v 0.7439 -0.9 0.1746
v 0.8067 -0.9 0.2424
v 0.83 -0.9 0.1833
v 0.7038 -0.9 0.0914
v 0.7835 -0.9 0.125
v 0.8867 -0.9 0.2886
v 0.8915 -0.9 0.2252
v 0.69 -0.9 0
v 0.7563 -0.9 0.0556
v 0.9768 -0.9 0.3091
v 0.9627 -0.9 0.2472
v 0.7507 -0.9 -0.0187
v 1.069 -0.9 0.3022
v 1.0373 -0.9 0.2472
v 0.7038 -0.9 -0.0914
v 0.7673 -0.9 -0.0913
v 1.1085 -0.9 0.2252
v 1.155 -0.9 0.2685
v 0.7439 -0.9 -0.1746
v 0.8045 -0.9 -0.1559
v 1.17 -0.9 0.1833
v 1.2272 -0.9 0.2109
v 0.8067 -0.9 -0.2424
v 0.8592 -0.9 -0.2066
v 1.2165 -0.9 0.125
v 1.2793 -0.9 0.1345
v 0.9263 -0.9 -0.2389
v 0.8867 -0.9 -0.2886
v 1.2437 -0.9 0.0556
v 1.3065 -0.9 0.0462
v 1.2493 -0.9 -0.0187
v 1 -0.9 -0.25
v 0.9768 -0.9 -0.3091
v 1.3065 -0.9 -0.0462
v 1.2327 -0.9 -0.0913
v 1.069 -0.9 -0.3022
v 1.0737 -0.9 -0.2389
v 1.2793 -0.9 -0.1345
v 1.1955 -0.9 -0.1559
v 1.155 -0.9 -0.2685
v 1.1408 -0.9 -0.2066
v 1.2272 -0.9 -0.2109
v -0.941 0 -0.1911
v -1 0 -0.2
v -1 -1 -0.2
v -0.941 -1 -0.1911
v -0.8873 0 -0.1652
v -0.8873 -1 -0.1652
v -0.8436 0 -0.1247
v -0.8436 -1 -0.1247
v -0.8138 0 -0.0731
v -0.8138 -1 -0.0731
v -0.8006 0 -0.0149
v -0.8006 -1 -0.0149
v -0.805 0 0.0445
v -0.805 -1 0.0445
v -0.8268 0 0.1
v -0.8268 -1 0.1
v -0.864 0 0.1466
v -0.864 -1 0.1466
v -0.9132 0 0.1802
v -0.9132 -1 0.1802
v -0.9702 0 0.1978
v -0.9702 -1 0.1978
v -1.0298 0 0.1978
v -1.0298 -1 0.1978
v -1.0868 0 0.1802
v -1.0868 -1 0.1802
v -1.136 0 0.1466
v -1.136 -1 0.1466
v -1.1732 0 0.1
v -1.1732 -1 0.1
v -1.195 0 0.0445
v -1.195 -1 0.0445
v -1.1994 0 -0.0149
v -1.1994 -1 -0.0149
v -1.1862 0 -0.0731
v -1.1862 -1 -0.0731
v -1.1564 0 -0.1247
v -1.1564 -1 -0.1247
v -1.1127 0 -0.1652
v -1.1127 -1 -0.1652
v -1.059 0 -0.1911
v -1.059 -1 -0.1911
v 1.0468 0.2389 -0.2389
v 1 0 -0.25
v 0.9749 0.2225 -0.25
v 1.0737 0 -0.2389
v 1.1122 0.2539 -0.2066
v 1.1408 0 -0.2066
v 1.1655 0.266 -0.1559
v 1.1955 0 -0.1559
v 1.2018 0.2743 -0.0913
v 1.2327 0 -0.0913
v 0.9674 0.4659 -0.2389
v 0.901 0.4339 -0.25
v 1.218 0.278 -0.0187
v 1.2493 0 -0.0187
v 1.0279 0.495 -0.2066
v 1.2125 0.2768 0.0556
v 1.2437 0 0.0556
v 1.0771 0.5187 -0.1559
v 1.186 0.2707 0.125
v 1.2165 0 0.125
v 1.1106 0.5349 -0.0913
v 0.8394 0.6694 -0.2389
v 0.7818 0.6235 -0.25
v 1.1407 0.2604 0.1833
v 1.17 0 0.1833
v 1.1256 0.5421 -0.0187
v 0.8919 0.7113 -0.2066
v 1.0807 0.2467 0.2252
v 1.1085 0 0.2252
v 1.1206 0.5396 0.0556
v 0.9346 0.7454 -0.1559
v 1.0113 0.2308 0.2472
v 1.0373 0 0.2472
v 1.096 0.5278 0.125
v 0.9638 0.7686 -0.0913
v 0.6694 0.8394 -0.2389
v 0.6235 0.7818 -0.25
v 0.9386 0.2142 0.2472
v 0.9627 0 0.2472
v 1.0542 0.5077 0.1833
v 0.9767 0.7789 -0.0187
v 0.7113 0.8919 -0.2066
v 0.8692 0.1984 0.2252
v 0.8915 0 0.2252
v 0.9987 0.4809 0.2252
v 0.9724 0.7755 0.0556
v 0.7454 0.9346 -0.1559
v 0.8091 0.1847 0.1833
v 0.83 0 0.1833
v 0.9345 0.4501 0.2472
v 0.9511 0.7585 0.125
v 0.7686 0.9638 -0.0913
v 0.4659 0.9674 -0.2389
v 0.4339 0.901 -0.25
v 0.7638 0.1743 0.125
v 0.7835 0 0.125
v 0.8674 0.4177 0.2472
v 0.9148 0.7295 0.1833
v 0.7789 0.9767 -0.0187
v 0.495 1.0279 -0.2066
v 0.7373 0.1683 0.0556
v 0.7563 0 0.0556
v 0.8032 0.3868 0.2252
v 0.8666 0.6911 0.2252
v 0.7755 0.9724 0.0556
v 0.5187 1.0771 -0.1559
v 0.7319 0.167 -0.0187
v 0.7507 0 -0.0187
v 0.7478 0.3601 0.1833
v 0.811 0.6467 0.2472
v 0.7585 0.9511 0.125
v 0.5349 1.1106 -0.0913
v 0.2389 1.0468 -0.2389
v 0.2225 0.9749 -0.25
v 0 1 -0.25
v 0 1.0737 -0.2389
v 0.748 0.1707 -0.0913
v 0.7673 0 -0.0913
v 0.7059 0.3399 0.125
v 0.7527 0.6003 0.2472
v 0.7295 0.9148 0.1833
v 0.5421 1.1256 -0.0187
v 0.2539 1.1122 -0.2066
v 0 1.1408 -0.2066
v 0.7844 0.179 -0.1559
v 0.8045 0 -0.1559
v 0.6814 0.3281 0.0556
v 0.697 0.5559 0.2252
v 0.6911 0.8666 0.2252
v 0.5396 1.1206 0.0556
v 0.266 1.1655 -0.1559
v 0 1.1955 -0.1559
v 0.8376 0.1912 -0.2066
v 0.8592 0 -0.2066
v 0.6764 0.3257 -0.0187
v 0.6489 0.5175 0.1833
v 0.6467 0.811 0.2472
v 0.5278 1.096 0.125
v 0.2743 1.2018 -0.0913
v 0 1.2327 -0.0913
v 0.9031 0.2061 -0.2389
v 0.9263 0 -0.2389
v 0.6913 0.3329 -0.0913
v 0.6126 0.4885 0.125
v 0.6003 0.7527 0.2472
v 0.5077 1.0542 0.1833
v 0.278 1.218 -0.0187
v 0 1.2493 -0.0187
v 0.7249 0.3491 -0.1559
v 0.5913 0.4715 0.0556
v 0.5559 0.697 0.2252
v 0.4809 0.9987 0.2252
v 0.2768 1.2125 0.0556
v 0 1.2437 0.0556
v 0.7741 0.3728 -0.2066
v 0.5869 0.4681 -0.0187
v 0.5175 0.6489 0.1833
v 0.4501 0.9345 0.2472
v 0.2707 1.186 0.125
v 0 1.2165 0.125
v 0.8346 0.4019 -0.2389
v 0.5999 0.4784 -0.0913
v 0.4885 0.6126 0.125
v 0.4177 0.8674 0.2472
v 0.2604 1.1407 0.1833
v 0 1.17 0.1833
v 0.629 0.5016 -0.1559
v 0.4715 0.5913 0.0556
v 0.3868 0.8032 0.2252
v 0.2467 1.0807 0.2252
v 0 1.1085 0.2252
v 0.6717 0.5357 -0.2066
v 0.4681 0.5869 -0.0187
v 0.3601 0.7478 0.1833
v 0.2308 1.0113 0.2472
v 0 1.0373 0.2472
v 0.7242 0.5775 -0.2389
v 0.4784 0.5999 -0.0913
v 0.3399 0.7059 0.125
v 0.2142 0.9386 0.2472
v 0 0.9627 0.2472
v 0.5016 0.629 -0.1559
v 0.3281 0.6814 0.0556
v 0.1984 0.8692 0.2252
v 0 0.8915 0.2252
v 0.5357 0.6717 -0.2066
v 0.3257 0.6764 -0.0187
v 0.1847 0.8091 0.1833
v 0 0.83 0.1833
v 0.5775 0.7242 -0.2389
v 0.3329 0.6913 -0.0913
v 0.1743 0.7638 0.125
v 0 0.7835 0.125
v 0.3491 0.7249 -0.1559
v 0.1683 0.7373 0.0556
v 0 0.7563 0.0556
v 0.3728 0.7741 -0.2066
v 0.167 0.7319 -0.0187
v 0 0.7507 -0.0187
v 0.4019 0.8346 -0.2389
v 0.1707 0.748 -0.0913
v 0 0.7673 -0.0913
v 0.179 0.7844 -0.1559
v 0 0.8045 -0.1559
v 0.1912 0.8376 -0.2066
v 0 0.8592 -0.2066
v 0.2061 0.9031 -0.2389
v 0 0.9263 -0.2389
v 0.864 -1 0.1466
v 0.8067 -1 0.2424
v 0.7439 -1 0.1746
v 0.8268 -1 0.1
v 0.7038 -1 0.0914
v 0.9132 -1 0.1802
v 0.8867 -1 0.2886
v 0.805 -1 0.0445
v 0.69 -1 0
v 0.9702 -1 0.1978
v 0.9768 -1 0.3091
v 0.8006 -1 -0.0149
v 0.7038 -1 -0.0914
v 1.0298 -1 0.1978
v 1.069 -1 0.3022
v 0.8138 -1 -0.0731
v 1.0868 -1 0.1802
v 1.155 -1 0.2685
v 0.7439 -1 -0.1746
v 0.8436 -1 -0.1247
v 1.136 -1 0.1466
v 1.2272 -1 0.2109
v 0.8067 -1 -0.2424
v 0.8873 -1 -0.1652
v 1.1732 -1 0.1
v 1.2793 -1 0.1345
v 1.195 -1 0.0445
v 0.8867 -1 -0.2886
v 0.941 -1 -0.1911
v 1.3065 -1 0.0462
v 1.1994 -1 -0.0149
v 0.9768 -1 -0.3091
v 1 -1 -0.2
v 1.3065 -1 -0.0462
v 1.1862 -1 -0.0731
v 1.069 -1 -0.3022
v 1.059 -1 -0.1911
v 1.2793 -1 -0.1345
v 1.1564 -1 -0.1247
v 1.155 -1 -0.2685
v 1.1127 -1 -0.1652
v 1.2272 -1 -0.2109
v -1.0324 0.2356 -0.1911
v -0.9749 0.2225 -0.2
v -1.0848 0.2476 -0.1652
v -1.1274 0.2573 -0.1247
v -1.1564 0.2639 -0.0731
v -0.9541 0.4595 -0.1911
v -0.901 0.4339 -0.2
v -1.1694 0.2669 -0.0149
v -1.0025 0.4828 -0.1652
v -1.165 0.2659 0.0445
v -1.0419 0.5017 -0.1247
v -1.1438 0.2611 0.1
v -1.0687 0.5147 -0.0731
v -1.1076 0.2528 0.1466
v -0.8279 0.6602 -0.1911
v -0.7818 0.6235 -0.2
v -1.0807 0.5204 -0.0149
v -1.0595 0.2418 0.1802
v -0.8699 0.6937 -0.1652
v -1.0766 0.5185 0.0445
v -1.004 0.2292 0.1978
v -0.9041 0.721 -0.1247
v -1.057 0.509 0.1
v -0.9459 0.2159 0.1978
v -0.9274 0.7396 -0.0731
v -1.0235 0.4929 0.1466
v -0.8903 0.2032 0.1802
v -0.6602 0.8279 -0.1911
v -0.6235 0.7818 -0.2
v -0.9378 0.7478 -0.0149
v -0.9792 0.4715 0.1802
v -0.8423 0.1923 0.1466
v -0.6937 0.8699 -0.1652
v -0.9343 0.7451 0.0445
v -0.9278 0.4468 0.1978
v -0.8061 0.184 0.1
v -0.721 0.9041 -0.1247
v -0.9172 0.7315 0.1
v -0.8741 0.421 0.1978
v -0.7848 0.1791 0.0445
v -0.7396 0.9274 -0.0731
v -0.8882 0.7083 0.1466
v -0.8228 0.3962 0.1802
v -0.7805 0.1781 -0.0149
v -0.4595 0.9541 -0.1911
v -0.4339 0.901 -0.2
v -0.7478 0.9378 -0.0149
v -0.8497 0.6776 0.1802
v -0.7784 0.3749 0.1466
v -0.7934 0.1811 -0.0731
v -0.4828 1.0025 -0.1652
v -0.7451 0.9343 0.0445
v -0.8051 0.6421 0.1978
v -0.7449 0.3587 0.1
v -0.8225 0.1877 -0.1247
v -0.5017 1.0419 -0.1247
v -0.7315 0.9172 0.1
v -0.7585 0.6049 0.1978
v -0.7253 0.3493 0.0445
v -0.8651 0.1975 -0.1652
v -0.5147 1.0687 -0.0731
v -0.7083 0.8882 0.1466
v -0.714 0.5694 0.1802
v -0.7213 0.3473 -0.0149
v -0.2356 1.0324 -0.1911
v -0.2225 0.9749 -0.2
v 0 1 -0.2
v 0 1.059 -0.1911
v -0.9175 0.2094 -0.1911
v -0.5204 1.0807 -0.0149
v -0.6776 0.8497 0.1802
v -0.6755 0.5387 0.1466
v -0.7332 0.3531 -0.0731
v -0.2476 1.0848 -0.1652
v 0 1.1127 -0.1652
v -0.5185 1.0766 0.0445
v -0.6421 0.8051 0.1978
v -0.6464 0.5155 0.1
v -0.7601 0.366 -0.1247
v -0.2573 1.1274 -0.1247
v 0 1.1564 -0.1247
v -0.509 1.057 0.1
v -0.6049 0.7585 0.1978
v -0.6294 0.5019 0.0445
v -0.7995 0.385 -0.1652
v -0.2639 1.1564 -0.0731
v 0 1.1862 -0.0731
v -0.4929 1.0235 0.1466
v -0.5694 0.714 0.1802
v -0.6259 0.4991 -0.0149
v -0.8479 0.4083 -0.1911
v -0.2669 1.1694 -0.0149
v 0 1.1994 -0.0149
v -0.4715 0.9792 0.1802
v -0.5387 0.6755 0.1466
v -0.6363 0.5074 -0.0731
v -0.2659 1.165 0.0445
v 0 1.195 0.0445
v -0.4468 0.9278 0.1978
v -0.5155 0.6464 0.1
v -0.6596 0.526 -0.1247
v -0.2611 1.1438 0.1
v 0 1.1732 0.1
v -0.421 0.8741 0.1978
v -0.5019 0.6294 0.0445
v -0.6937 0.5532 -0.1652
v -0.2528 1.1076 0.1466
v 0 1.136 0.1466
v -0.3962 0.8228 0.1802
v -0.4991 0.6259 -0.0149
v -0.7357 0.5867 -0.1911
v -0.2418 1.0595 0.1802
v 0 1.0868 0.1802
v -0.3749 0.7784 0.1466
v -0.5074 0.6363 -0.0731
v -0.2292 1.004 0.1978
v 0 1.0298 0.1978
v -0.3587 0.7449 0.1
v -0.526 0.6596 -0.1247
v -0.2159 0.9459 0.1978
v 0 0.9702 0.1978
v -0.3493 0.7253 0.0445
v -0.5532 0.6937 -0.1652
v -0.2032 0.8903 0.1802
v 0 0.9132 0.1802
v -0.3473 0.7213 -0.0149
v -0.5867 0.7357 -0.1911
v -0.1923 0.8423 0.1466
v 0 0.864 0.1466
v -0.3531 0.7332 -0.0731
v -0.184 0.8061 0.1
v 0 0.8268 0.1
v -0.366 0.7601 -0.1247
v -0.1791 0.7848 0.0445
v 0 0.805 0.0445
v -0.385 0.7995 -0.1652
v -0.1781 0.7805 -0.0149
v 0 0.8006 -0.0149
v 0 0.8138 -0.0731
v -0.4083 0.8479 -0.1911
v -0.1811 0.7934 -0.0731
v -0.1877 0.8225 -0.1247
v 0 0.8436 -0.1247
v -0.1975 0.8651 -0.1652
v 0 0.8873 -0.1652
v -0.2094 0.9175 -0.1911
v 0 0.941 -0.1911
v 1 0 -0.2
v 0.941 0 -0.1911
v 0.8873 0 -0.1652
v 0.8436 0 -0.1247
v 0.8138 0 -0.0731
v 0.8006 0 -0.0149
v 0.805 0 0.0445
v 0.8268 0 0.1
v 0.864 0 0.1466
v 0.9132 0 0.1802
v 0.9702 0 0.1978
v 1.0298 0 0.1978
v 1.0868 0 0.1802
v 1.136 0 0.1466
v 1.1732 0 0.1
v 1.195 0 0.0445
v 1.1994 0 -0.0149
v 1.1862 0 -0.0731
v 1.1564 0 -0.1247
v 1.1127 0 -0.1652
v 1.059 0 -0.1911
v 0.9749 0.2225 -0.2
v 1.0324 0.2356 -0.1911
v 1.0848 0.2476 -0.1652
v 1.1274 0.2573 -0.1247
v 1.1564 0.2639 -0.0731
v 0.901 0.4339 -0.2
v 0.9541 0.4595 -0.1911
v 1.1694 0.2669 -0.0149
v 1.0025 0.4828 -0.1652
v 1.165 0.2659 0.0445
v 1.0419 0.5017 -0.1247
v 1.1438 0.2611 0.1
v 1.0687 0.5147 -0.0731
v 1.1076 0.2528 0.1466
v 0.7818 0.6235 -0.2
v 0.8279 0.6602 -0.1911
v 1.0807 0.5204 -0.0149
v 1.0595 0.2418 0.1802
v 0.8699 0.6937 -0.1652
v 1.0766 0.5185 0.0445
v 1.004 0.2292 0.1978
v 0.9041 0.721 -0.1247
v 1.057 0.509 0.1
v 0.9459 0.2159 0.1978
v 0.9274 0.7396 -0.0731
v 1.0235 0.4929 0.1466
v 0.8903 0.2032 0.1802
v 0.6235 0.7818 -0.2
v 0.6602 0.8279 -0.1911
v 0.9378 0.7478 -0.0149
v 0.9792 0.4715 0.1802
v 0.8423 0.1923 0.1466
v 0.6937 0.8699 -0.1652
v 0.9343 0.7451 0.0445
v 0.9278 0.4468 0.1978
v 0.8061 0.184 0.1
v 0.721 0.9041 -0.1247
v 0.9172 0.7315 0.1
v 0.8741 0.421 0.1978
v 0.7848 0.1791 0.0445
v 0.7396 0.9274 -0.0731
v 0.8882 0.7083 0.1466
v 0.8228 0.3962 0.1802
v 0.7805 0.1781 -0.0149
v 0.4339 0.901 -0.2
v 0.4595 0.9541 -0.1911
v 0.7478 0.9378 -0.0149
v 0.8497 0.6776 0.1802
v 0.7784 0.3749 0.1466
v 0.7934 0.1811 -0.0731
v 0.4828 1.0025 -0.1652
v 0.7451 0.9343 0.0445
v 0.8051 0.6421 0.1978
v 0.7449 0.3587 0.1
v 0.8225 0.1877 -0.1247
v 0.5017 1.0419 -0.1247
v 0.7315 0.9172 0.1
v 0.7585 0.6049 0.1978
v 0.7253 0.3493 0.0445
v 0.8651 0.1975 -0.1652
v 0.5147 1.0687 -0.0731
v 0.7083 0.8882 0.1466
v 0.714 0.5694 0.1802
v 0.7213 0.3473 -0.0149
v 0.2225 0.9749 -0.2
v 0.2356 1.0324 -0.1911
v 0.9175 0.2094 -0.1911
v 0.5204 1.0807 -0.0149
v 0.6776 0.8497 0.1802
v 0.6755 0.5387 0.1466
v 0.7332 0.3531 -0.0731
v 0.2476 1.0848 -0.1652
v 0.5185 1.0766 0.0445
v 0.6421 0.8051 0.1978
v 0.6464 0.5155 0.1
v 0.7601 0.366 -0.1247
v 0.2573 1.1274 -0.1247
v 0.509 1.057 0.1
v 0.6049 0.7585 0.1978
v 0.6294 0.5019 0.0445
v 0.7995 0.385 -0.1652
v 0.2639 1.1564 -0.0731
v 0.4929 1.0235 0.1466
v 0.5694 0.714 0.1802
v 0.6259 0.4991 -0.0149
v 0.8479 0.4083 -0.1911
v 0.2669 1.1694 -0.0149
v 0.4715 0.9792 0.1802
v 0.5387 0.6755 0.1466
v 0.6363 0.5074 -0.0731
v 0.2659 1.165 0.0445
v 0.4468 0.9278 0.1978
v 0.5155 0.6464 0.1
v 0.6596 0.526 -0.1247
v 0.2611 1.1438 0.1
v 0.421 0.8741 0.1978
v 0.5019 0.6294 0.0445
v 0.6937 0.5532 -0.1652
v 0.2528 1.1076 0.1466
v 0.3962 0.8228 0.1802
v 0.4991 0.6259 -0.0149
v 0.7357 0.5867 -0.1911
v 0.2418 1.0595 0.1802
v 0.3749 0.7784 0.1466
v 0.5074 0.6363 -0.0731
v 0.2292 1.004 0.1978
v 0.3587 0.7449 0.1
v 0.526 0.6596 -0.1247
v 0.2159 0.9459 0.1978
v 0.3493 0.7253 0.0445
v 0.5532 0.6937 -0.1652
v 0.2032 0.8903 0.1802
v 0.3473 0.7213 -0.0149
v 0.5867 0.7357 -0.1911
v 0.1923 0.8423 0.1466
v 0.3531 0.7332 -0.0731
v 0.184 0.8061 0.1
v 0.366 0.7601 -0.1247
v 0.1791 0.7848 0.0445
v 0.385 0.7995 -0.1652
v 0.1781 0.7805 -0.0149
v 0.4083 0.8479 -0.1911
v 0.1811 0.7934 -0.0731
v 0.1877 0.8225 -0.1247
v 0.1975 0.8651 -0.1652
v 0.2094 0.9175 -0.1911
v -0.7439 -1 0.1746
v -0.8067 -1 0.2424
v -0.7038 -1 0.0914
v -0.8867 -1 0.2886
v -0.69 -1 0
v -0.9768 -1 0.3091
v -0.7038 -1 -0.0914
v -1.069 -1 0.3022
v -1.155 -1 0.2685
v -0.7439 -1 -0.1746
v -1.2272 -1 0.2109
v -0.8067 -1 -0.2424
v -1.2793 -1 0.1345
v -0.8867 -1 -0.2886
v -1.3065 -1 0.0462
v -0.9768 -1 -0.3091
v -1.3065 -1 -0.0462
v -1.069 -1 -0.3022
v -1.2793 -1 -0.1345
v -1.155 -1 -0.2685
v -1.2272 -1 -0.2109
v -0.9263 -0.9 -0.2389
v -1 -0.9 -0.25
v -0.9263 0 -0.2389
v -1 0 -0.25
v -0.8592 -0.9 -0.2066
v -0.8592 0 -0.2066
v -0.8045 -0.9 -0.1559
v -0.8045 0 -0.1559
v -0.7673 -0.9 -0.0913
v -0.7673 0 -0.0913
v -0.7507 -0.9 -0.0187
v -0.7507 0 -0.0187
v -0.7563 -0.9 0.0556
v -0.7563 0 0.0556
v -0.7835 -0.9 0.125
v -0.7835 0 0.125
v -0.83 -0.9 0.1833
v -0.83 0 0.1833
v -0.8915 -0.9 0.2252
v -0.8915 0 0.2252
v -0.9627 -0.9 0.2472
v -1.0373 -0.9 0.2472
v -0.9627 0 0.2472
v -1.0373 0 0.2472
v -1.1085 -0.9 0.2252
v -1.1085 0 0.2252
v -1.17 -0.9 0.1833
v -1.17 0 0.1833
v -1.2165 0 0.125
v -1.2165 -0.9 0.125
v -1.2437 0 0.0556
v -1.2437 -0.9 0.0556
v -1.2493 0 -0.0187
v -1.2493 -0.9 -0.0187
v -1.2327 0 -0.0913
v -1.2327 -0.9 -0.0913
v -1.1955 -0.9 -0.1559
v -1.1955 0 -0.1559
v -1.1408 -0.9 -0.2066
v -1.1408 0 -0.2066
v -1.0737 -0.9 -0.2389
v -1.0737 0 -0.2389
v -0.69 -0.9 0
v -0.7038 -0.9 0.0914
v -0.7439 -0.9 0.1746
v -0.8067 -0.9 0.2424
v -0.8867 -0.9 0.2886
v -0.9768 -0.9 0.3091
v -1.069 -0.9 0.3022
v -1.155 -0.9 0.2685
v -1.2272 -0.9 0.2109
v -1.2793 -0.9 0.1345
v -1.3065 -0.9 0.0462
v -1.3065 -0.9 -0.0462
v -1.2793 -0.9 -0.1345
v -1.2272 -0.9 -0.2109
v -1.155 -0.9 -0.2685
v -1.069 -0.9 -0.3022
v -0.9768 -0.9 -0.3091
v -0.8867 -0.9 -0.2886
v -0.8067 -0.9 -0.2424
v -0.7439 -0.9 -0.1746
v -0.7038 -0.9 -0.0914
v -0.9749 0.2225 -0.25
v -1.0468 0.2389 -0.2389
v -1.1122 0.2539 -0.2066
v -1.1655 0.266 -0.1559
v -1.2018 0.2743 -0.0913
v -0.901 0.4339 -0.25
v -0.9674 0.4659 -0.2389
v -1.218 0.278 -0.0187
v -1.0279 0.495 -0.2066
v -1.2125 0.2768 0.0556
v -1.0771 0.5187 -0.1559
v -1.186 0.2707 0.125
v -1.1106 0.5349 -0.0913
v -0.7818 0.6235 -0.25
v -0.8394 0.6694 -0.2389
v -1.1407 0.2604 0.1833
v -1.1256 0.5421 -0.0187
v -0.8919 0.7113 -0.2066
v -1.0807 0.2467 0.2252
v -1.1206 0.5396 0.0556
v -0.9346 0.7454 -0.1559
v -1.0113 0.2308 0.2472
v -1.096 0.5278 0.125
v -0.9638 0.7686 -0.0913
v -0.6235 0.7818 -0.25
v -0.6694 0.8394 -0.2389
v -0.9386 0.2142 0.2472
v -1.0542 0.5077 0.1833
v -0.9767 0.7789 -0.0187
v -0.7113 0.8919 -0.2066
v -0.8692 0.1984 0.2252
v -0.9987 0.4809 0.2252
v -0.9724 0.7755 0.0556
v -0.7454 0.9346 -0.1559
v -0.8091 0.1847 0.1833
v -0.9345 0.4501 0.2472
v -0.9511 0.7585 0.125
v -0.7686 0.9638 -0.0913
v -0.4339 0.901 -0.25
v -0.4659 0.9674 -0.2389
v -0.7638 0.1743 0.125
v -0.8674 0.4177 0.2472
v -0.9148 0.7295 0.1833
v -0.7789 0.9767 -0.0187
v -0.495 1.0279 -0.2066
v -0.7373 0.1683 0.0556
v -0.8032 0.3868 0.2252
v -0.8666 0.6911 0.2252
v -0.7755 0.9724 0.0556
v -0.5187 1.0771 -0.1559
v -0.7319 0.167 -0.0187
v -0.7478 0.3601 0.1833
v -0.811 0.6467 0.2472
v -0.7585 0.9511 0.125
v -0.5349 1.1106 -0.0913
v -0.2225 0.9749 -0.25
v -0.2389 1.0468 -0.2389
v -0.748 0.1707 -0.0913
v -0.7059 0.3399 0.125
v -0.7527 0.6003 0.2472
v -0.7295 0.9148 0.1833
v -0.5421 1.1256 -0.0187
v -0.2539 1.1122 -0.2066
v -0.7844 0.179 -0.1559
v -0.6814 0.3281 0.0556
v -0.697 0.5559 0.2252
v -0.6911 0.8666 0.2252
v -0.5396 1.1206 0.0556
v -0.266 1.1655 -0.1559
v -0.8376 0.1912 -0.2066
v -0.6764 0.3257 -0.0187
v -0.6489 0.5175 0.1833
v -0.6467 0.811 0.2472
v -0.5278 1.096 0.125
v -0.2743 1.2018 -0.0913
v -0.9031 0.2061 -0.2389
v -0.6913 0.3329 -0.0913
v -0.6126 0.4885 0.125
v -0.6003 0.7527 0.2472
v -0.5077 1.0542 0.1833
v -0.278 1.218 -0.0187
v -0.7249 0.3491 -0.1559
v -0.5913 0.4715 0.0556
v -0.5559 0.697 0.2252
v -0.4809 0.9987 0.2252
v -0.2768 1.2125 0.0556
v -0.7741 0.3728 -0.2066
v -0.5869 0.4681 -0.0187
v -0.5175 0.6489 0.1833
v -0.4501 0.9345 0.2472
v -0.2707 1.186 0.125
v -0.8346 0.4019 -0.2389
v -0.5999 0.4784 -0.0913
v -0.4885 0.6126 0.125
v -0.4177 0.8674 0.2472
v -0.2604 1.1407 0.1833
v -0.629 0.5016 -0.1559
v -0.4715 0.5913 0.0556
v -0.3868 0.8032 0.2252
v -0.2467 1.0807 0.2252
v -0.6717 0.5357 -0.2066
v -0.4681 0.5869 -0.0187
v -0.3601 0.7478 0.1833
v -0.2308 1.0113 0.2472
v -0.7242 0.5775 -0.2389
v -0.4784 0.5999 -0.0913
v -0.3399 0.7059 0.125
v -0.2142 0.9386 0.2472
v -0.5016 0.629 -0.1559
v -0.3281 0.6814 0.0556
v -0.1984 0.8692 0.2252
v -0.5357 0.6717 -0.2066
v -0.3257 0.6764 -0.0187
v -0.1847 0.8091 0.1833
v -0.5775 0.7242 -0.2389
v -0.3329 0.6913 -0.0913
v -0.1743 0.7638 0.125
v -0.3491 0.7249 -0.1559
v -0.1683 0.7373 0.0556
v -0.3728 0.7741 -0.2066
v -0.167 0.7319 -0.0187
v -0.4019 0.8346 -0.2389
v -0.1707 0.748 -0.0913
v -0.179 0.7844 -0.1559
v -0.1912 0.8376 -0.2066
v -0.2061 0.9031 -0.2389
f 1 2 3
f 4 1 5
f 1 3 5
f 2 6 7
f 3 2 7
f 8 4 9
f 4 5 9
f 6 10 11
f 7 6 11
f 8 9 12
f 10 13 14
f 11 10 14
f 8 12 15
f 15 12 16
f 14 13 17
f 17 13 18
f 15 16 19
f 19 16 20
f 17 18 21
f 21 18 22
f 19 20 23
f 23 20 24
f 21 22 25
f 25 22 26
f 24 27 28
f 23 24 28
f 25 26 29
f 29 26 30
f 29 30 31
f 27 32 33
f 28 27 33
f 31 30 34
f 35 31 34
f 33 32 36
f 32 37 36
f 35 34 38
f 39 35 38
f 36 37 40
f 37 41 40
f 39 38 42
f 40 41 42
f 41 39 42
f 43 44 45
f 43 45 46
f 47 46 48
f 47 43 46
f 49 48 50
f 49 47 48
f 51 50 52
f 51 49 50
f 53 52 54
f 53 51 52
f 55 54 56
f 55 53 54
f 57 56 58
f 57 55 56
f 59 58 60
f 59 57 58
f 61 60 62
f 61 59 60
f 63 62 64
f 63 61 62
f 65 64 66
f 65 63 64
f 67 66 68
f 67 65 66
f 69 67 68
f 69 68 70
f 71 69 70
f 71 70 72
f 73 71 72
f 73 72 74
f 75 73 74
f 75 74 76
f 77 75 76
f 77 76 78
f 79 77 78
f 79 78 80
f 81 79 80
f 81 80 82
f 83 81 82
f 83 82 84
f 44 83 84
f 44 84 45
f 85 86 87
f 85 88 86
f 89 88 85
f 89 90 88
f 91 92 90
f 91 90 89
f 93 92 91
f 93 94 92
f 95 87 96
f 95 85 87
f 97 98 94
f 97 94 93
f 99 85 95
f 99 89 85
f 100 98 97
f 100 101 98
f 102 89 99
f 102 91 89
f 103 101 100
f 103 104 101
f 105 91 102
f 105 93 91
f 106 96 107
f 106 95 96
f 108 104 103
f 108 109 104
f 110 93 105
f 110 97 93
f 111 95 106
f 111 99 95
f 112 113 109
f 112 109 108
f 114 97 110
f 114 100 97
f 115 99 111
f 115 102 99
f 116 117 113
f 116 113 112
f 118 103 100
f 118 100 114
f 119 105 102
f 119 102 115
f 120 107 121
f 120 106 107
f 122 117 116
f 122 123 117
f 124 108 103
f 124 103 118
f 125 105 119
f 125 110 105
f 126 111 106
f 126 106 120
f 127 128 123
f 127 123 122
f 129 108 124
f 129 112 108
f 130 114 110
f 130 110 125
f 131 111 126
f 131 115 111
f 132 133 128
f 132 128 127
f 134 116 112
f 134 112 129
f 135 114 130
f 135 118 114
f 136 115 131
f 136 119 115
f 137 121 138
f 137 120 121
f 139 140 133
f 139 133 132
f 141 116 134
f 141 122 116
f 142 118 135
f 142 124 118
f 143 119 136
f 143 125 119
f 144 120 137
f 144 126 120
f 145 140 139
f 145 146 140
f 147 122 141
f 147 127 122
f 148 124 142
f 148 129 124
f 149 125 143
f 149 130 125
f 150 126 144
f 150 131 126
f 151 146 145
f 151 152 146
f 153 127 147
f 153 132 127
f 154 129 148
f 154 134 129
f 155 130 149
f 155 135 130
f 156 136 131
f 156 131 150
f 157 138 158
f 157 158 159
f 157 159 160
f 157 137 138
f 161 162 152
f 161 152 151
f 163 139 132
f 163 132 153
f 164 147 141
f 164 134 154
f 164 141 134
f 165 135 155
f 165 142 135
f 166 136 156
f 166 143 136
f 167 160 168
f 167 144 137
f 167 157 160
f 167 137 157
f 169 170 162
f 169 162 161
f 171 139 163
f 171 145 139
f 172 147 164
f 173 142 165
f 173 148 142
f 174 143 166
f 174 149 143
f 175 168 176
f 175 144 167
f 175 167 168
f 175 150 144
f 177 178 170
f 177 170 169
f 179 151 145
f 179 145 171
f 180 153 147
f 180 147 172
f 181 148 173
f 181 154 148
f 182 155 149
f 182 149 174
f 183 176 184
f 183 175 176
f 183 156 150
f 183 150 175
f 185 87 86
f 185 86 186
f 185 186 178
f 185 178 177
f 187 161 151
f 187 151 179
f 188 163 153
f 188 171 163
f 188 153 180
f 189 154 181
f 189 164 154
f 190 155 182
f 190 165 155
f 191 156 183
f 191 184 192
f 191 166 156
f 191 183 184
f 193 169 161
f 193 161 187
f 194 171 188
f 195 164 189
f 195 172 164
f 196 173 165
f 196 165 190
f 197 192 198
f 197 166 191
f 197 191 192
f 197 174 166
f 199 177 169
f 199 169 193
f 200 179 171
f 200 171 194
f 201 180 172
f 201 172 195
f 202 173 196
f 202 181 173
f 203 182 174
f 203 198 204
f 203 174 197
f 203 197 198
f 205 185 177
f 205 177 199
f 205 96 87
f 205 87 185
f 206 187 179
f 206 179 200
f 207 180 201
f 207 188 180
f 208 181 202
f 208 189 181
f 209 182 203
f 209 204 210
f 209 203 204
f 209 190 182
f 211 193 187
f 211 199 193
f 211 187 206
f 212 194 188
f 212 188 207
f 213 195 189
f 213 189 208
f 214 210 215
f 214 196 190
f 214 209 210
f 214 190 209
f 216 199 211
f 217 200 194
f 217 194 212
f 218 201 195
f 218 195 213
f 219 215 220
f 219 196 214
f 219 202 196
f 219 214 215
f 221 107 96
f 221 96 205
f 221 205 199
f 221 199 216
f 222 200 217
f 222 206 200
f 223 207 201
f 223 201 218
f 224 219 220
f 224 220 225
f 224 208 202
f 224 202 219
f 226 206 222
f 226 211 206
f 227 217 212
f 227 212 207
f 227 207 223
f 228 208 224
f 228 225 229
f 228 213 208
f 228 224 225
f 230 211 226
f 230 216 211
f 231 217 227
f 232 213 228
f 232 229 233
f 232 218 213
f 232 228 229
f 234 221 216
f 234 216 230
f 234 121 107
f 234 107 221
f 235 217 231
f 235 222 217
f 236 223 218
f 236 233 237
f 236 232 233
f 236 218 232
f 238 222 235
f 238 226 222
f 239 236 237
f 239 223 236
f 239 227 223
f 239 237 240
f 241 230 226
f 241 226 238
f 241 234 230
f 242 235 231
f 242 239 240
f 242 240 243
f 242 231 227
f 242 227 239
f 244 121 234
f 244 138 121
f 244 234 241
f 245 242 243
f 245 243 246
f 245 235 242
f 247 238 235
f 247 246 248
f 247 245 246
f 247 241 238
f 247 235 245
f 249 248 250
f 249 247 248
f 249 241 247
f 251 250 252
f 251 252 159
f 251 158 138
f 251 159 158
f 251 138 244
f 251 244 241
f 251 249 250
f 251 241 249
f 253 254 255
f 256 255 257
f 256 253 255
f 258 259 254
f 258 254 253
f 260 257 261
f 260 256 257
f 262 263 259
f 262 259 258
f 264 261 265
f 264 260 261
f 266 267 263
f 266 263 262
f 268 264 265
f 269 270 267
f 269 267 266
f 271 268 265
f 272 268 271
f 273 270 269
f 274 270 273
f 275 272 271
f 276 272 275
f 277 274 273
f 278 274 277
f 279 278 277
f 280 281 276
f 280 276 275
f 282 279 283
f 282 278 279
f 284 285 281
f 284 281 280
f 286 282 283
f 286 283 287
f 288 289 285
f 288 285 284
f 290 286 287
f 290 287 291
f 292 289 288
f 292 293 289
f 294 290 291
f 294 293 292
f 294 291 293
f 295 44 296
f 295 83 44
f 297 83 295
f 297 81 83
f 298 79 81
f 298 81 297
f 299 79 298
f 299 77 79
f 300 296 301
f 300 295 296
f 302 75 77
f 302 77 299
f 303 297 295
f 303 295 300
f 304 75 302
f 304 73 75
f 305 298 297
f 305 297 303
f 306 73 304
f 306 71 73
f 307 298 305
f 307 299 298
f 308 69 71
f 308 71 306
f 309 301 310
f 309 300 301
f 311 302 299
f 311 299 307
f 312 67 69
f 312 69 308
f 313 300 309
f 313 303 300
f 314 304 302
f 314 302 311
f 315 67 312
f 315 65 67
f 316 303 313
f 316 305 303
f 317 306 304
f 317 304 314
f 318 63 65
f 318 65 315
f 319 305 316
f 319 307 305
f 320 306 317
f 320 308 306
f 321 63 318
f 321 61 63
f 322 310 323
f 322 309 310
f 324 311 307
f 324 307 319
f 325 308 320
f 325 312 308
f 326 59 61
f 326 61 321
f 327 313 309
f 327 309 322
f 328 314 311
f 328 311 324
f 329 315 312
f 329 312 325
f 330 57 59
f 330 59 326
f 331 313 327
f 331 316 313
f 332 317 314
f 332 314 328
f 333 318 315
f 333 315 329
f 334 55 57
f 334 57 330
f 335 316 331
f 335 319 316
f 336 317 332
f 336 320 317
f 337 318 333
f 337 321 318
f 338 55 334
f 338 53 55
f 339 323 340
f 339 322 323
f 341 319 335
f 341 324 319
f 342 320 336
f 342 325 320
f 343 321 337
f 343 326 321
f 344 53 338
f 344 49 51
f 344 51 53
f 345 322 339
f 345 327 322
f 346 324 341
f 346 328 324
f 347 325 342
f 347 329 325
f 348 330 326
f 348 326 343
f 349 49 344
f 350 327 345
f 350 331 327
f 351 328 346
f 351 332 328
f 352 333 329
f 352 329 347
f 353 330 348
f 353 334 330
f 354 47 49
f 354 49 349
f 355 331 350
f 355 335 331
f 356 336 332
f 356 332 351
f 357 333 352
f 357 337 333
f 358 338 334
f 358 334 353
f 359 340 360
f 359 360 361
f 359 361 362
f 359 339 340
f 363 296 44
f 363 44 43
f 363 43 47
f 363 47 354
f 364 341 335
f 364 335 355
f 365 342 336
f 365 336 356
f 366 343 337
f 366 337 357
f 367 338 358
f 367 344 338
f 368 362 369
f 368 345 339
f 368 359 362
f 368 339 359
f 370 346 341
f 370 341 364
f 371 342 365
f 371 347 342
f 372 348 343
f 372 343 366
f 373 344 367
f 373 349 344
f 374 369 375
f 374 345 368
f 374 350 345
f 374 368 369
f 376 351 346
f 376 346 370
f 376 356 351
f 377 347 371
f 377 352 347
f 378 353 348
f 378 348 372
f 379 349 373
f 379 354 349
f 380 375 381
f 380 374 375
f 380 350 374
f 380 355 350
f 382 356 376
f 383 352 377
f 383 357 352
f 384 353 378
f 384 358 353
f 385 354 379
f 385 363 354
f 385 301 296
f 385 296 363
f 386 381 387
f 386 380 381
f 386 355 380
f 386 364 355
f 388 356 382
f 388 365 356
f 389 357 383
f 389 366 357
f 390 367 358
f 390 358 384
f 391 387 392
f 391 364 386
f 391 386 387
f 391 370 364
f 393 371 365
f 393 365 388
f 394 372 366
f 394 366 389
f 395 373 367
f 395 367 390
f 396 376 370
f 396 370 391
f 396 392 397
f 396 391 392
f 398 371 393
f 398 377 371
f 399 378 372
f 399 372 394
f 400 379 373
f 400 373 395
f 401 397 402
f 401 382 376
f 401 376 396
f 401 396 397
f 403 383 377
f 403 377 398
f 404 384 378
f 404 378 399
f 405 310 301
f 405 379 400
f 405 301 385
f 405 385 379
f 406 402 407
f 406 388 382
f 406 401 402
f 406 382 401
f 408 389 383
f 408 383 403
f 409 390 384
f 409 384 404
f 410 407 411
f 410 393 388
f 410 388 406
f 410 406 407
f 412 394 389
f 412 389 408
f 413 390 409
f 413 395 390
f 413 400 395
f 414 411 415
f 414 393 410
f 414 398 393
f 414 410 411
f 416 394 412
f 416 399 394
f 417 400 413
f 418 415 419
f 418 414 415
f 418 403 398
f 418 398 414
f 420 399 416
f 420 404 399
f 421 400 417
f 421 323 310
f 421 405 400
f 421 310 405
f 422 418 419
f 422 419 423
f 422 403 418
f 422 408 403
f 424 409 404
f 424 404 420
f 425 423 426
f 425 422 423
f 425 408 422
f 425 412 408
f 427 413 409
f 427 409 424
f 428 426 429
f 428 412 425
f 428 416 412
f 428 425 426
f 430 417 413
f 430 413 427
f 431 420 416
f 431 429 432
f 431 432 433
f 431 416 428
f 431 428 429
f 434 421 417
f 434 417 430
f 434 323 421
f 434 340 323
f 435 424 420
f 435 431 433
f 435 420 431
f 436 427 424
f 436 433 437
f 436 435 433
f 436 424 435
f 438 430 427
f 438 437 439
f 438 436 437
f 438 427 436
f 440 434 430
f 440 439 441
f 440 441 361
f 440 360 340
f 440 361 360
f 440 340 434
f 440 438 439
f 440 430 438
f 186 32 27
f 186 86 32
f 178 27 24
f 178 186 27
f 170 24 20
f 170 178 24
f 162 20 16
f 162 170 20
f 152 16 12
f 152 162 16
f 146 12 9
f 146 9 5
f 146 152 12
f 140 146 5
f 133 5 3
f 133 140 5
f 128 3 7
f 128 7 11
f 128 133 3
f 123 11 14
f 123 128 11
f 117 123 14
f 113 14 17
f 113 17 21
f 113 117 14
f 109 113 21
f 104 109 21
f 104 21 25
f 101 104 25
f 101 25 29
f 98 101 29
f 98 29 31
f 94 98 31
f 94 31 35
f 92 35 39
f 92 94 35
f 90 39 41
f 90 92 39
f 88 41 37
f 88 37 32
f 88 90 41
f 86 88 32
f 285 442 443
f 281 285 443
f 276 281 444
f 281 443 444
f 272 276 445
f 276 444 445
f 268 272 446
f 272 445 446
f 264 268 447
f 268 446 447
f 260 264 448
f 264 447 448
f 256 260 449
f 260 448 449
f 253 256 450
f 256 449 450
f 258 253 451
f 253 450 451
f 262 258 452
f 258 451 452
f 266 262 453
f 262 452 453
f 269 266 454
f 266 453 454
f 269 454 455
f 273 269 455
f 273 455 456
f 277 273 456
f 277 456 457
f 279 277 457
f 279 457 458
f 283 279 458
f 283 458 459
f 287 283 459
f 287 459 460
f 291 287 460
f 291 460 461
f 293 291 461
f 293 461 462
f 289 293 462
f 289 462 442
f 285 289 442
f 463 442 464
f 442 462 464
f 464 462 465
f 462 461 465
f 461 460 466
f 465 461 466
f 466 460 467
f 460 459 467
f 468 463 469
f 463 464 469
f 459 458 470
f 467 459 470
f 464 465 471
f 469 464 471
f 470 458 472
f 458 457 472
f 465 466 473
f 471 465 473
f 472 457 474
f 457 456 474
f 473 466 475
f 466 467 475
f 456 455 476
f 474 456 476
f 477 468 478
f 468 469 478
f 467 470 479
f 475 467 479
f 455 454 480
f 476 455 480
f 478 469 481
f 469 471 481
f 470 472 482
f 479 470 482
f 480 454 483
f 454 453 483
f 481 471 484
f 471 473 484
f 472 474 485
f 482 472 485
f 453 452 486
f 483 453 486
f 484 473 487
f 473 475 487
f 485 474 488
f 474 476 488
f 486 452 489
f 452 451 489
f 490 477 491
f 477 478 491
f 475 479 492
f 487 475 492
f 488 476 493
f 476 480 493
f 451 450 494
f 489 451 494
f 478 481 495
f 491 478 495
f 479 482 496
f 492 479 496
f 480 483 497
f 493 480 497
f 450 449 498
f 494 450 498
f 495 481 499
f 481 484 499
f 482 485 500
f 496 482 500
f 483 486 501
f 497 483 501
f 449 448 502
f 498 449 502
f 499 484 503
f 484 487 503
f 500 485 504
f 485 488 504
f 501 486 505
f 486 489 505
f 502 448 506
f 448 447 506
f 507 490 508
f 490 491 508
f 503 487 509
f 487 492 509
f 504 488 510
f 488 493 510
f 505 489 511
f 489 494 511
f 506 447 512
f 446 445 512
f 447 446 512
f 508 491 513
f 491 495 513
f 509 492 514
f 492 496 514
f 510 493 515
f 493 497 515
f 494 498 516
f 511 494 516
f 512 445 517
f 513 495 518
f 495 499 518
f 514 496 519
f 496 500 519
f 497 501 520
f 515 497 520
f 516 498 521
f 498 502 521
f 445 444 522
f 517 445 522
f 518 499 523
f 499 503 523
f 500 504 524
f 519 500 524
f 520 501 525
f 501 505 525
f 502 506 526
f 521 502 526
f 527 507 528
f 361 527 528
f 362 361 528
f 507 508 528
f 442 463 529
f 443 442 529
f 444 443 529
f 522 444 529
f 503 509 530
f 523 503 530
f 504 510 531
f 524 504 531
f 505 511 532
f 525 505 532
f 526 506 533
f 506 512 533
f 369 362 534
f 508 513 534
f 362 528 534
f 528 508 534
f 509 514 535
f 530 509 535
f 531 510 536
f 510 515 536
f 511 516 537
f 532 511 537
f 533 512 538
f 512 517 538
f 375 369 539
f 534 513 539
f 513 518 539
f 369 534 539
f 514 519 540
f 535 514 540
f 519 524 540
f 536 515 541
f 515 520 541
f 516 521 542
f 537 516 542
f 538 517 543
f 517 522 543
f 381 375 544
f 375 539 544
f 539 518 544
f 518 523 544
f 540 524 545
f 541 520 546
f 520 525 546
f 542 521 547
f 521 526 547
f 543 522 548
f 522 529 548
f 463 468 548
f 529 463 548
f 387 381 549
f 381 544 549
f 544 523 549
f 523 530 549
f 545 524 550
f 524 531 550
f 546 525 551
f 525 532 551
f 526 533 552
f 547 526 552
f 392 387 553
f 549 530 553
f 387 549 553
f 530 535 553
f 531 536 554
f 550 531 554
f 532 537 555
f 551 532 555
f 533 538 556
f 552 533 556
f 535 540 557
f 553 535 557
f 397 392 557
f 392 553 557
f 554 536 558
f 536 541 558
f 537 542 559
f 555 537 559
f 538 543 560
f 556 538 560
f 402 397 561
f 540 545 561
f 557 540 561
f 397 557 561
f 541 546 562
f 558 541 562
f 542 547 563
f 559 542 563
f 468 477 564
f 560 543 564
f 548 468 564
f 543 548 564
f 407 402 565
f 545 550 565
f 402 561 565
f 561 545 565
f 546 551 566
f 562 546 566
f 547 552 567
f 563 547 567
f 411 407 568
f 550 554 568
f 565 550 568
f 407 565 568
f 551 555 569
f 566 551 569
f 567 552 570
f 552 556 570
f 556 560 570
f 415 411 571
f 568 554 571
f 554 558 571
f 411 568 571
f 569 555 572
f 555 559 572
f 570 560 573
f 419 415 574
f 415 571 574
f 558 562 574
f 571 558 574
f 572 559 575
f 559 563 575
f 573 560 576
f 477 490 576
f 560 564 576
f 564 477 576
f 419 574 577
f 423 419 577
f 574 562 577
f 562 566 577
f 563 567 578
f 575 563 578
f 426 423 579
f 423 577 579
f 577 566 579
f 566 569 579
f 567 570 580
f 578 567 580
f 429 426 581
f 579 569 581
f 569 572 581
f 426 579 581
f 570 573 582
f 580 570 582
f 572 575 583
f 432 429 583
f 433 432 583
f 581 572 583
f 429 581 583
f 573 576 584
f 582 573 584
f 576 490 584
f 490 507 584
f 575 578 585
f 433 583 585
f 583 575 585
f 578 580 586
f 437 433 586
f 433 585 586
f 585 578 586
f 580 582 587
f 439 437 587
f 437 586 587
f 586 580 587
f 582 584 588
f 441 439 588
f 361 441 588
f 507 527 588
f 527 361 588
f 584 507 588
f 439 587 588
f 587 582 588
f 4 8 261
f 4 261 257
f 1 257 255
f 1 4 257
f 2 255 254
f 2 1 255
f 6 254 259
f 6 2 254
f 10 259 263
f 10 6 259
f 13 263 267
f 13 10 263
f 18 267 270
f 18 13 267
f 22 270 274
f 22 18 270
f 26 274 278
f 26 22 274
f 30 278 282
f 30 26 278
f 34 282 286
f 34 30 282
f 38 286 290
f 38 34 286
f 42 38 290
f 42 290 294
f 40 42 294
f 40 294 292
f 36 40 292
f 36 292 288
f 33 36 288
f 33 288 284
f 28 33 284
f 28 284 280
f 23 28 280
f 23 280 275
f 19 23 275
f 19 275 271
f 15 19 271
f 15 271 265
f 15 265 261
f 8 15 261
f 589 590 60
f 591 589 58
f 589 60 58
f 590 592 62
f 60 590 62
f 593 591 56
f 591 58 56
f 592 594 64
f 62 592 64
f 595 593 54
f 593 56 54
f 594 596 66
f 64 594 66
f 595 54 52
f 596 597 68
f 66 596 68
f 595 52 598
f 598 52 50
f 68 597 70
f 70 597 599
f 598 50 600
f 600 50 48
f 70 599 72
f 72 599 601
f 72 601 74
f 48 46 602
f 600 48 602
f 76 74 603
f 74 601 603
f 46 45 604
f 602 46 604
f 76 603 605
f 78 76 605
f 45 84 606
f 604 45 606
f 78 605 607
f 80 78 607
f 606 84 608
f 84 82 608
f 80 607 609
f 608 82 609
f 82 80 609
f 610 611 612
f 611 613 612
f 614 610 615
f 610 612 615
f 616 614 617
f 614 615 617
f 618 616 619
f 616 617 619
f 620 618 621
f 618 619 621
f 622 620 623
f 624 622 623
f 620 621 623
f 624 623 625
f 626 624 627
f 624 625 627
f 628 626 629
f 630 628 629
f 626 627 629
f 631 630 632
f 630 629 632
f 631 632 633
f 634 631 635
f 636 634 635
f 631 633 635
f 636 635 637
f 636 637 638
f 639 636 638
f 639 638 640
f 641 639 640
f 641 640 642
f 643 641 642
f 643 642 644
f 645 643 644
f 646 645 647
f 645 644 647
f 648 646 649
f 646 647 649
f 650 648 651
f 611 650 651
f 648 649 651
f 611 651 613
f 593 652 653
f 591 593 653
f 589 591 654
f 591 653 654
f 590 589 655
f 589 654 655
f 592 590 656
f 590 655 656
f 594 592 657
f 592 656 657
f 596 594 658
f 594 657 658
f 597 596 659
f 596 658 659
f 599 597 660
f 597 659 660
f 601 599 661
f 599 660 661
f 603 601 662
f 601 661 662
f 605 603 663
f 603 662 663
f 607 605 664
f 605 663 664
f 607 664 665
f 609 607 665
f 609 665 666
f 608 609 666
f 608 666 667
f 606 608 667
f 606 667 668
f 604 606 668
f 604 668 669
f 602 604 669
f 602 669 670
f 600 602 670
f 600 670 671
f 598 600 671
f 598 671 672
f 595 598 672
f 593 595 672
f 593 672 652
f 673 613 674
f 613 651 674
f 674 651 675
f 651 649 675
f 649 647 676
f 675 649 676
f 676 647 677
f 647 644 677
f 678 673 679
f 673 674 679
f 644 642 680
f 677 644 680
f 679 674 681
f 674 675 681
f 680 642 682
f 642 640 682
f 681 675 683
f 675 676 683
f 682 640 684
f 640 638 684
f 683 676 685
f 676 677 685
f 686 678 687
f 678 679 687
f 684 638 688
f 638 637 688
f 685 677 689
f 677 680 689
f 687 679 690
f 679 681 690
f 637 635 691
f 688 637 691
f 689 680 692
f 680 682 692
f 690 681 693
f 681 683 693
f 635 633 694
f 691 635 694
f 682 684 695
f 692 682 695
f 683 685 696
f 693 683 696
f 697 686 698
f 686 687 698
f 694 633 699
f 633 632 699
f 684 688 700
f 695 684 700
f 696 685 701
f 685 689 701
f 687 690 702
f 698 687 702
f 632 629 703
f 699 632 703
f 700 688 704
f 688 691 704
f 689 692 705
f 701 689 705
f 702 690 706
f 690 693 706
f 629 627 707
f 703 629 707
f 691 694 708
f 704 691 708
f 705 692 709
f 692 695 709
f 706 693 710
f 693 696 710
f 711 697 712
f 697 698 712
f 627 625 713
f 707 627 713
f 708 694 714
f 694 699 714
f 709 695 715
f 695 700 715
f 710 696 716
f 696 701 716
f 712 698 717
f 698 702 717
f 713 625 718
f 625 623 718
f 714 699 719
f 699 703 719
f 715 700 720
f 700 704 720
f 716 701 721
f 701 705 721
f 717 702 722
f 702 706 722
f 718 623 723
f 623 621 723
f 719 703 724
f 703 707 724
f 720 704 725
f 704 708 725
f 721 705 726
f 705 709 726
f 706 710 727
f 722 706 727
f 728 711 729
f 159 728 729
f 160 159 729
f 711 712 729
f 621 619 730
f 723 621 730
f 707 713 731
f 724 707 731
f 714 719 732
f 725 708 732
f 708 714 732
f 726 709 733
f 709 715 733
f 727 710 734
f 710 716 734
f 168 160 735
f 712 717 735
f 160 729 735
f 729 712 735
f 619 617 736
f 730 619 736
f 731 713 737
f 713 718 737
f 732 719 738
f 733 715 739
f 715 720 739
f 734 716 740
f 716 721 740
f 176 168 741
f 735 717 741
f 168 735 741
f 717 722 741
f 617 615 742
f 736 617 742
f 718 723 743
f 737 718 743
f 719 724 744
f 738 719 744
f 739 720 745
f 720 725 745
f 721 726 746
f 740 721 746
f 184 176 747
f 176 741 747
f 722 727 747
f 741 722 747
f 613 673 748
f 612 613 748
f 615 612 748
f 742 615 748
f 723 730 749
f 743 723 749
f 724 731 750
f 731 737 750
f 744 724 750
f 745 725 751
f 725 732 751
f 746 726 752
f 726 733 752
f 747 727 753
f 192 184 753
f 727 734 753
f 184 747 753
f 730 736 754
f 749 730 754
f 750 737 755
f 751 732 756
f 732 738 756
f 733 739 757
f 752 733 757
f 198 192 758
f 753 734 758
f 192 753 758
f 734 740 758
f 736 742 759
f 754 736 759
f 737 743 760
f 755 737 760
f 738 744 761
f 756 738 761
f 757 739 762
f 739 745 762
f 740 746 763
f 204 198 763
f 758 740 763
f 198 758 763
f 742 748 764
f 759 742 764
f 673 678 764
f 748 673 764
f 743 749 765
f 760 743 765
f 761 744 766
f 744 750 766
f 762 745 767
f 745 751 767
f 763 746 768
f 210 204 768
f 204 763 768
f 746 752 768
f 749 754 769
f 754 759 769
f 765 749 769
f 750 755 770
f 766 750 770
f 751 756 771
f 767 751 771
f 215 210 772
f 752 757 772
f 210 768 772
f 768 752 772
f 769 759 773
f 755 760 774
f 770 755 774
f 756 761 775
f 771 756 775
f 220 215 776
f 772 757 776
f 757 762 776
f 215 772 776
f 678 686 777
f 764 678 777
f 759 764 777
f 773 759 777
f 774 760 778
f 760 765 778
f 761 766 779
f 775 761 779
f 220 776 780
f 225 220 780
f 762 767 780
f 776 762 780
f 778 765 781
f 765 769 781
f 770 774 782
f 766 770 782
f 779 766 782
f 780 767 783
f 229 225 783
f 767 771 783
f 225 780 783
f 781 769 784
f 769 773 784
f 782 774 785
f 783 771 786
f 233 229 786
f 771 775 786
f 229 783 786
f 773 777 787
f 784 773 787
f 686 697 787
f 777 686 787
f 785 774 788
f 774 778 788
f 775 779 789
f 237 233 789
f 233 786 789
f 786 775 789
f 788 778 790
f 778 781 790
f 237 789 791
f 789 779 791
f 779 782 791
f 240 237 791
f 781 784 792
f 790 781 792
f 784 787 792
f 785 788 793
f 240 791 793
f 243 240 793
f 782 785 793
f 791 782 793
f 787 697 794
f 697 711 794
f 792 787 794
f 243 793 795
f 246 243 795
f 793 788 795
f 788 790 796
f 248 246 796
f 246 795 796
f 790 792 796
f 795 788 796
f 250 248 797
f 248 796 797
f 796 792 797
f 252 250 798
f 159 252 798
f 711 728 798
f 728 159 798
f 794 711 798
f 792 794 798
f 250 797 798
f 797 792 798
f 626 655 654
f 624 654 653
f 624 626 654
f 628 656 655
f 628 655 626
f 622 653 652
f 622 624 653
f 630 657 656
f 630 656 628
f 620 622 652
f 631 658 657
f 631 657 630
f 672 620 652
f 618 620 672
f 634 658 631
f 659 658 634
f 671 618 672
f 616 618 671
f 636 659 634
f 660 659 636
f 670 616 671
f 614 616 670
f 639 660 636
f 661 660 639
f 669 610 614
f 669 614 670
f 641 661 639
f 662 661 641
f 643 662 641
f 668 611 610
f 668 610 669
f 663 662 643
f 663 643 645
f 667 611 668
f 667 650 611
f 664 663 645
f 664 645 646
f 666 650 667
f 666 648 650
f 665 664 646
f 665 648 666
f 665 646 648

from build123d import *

# Parameters (mm, degrees)
IZIM3_R   = 0.25
IZIM3_R_2 = 0.2
IZIM5_R   = 0.31
IZIM5_R_2 = 0.21


with BuildPart() as part:
    # Süpür-İnce1: sweep along a path in Çizim1
    with BuildLine(Plane.XY) as s_p_r_nce1_path:
        Line((1, -1), (1, 0))
        ThreePointArc((1, 0), (0.707106781, 0.707106781), (0, 1))
    # Çizim3 → Süpür-İnce1 (sweep)
    with BuildSketch(Plane(origin=(0, 0, 0), x_dir=(0, 0, -1), z_dir=(1, 0, 0))):
        with Locations((0, 1)):
            Circle(IZIM3_R)
        with Locations((0, 1)):
            Circle(IZIM3_R_2, mode=Mode.SUBTRACT)
    sweep(path=s_p_r_nce1_path.line)

    # Süpür-İnce3: sweep along a path in Çizim6
    with BuildLine(Plane.XY) as s_p_r_nce3_path:
        Line((1, -1), (1, -0.9))
    # Çizim5 → Süpür-İnce3 (sweep)
    with BuildSketch(Plane(origin=(0, -1, 0), x_dir=(-1, 0, 0), z_dir=(0, -1, 0))):
        with Locations((-1, 0)):
            Circle(IZIM5_R)
        with Locations((-1, 0)):
            Circle(IZIM5_R_2, mode=Mode.SUBTRACT)
    sweep(path=s_p_r_nce3_path.line)

    # Aynalama1: part across plane


with BuildPart() as part_1:
    add(part.part)
    add(part.part.mirror(Plane(origin=(0, 0, 0), x_dir=(0, 0, 1), z_dir=(1, 0, 0))))


solid = part_1.part
